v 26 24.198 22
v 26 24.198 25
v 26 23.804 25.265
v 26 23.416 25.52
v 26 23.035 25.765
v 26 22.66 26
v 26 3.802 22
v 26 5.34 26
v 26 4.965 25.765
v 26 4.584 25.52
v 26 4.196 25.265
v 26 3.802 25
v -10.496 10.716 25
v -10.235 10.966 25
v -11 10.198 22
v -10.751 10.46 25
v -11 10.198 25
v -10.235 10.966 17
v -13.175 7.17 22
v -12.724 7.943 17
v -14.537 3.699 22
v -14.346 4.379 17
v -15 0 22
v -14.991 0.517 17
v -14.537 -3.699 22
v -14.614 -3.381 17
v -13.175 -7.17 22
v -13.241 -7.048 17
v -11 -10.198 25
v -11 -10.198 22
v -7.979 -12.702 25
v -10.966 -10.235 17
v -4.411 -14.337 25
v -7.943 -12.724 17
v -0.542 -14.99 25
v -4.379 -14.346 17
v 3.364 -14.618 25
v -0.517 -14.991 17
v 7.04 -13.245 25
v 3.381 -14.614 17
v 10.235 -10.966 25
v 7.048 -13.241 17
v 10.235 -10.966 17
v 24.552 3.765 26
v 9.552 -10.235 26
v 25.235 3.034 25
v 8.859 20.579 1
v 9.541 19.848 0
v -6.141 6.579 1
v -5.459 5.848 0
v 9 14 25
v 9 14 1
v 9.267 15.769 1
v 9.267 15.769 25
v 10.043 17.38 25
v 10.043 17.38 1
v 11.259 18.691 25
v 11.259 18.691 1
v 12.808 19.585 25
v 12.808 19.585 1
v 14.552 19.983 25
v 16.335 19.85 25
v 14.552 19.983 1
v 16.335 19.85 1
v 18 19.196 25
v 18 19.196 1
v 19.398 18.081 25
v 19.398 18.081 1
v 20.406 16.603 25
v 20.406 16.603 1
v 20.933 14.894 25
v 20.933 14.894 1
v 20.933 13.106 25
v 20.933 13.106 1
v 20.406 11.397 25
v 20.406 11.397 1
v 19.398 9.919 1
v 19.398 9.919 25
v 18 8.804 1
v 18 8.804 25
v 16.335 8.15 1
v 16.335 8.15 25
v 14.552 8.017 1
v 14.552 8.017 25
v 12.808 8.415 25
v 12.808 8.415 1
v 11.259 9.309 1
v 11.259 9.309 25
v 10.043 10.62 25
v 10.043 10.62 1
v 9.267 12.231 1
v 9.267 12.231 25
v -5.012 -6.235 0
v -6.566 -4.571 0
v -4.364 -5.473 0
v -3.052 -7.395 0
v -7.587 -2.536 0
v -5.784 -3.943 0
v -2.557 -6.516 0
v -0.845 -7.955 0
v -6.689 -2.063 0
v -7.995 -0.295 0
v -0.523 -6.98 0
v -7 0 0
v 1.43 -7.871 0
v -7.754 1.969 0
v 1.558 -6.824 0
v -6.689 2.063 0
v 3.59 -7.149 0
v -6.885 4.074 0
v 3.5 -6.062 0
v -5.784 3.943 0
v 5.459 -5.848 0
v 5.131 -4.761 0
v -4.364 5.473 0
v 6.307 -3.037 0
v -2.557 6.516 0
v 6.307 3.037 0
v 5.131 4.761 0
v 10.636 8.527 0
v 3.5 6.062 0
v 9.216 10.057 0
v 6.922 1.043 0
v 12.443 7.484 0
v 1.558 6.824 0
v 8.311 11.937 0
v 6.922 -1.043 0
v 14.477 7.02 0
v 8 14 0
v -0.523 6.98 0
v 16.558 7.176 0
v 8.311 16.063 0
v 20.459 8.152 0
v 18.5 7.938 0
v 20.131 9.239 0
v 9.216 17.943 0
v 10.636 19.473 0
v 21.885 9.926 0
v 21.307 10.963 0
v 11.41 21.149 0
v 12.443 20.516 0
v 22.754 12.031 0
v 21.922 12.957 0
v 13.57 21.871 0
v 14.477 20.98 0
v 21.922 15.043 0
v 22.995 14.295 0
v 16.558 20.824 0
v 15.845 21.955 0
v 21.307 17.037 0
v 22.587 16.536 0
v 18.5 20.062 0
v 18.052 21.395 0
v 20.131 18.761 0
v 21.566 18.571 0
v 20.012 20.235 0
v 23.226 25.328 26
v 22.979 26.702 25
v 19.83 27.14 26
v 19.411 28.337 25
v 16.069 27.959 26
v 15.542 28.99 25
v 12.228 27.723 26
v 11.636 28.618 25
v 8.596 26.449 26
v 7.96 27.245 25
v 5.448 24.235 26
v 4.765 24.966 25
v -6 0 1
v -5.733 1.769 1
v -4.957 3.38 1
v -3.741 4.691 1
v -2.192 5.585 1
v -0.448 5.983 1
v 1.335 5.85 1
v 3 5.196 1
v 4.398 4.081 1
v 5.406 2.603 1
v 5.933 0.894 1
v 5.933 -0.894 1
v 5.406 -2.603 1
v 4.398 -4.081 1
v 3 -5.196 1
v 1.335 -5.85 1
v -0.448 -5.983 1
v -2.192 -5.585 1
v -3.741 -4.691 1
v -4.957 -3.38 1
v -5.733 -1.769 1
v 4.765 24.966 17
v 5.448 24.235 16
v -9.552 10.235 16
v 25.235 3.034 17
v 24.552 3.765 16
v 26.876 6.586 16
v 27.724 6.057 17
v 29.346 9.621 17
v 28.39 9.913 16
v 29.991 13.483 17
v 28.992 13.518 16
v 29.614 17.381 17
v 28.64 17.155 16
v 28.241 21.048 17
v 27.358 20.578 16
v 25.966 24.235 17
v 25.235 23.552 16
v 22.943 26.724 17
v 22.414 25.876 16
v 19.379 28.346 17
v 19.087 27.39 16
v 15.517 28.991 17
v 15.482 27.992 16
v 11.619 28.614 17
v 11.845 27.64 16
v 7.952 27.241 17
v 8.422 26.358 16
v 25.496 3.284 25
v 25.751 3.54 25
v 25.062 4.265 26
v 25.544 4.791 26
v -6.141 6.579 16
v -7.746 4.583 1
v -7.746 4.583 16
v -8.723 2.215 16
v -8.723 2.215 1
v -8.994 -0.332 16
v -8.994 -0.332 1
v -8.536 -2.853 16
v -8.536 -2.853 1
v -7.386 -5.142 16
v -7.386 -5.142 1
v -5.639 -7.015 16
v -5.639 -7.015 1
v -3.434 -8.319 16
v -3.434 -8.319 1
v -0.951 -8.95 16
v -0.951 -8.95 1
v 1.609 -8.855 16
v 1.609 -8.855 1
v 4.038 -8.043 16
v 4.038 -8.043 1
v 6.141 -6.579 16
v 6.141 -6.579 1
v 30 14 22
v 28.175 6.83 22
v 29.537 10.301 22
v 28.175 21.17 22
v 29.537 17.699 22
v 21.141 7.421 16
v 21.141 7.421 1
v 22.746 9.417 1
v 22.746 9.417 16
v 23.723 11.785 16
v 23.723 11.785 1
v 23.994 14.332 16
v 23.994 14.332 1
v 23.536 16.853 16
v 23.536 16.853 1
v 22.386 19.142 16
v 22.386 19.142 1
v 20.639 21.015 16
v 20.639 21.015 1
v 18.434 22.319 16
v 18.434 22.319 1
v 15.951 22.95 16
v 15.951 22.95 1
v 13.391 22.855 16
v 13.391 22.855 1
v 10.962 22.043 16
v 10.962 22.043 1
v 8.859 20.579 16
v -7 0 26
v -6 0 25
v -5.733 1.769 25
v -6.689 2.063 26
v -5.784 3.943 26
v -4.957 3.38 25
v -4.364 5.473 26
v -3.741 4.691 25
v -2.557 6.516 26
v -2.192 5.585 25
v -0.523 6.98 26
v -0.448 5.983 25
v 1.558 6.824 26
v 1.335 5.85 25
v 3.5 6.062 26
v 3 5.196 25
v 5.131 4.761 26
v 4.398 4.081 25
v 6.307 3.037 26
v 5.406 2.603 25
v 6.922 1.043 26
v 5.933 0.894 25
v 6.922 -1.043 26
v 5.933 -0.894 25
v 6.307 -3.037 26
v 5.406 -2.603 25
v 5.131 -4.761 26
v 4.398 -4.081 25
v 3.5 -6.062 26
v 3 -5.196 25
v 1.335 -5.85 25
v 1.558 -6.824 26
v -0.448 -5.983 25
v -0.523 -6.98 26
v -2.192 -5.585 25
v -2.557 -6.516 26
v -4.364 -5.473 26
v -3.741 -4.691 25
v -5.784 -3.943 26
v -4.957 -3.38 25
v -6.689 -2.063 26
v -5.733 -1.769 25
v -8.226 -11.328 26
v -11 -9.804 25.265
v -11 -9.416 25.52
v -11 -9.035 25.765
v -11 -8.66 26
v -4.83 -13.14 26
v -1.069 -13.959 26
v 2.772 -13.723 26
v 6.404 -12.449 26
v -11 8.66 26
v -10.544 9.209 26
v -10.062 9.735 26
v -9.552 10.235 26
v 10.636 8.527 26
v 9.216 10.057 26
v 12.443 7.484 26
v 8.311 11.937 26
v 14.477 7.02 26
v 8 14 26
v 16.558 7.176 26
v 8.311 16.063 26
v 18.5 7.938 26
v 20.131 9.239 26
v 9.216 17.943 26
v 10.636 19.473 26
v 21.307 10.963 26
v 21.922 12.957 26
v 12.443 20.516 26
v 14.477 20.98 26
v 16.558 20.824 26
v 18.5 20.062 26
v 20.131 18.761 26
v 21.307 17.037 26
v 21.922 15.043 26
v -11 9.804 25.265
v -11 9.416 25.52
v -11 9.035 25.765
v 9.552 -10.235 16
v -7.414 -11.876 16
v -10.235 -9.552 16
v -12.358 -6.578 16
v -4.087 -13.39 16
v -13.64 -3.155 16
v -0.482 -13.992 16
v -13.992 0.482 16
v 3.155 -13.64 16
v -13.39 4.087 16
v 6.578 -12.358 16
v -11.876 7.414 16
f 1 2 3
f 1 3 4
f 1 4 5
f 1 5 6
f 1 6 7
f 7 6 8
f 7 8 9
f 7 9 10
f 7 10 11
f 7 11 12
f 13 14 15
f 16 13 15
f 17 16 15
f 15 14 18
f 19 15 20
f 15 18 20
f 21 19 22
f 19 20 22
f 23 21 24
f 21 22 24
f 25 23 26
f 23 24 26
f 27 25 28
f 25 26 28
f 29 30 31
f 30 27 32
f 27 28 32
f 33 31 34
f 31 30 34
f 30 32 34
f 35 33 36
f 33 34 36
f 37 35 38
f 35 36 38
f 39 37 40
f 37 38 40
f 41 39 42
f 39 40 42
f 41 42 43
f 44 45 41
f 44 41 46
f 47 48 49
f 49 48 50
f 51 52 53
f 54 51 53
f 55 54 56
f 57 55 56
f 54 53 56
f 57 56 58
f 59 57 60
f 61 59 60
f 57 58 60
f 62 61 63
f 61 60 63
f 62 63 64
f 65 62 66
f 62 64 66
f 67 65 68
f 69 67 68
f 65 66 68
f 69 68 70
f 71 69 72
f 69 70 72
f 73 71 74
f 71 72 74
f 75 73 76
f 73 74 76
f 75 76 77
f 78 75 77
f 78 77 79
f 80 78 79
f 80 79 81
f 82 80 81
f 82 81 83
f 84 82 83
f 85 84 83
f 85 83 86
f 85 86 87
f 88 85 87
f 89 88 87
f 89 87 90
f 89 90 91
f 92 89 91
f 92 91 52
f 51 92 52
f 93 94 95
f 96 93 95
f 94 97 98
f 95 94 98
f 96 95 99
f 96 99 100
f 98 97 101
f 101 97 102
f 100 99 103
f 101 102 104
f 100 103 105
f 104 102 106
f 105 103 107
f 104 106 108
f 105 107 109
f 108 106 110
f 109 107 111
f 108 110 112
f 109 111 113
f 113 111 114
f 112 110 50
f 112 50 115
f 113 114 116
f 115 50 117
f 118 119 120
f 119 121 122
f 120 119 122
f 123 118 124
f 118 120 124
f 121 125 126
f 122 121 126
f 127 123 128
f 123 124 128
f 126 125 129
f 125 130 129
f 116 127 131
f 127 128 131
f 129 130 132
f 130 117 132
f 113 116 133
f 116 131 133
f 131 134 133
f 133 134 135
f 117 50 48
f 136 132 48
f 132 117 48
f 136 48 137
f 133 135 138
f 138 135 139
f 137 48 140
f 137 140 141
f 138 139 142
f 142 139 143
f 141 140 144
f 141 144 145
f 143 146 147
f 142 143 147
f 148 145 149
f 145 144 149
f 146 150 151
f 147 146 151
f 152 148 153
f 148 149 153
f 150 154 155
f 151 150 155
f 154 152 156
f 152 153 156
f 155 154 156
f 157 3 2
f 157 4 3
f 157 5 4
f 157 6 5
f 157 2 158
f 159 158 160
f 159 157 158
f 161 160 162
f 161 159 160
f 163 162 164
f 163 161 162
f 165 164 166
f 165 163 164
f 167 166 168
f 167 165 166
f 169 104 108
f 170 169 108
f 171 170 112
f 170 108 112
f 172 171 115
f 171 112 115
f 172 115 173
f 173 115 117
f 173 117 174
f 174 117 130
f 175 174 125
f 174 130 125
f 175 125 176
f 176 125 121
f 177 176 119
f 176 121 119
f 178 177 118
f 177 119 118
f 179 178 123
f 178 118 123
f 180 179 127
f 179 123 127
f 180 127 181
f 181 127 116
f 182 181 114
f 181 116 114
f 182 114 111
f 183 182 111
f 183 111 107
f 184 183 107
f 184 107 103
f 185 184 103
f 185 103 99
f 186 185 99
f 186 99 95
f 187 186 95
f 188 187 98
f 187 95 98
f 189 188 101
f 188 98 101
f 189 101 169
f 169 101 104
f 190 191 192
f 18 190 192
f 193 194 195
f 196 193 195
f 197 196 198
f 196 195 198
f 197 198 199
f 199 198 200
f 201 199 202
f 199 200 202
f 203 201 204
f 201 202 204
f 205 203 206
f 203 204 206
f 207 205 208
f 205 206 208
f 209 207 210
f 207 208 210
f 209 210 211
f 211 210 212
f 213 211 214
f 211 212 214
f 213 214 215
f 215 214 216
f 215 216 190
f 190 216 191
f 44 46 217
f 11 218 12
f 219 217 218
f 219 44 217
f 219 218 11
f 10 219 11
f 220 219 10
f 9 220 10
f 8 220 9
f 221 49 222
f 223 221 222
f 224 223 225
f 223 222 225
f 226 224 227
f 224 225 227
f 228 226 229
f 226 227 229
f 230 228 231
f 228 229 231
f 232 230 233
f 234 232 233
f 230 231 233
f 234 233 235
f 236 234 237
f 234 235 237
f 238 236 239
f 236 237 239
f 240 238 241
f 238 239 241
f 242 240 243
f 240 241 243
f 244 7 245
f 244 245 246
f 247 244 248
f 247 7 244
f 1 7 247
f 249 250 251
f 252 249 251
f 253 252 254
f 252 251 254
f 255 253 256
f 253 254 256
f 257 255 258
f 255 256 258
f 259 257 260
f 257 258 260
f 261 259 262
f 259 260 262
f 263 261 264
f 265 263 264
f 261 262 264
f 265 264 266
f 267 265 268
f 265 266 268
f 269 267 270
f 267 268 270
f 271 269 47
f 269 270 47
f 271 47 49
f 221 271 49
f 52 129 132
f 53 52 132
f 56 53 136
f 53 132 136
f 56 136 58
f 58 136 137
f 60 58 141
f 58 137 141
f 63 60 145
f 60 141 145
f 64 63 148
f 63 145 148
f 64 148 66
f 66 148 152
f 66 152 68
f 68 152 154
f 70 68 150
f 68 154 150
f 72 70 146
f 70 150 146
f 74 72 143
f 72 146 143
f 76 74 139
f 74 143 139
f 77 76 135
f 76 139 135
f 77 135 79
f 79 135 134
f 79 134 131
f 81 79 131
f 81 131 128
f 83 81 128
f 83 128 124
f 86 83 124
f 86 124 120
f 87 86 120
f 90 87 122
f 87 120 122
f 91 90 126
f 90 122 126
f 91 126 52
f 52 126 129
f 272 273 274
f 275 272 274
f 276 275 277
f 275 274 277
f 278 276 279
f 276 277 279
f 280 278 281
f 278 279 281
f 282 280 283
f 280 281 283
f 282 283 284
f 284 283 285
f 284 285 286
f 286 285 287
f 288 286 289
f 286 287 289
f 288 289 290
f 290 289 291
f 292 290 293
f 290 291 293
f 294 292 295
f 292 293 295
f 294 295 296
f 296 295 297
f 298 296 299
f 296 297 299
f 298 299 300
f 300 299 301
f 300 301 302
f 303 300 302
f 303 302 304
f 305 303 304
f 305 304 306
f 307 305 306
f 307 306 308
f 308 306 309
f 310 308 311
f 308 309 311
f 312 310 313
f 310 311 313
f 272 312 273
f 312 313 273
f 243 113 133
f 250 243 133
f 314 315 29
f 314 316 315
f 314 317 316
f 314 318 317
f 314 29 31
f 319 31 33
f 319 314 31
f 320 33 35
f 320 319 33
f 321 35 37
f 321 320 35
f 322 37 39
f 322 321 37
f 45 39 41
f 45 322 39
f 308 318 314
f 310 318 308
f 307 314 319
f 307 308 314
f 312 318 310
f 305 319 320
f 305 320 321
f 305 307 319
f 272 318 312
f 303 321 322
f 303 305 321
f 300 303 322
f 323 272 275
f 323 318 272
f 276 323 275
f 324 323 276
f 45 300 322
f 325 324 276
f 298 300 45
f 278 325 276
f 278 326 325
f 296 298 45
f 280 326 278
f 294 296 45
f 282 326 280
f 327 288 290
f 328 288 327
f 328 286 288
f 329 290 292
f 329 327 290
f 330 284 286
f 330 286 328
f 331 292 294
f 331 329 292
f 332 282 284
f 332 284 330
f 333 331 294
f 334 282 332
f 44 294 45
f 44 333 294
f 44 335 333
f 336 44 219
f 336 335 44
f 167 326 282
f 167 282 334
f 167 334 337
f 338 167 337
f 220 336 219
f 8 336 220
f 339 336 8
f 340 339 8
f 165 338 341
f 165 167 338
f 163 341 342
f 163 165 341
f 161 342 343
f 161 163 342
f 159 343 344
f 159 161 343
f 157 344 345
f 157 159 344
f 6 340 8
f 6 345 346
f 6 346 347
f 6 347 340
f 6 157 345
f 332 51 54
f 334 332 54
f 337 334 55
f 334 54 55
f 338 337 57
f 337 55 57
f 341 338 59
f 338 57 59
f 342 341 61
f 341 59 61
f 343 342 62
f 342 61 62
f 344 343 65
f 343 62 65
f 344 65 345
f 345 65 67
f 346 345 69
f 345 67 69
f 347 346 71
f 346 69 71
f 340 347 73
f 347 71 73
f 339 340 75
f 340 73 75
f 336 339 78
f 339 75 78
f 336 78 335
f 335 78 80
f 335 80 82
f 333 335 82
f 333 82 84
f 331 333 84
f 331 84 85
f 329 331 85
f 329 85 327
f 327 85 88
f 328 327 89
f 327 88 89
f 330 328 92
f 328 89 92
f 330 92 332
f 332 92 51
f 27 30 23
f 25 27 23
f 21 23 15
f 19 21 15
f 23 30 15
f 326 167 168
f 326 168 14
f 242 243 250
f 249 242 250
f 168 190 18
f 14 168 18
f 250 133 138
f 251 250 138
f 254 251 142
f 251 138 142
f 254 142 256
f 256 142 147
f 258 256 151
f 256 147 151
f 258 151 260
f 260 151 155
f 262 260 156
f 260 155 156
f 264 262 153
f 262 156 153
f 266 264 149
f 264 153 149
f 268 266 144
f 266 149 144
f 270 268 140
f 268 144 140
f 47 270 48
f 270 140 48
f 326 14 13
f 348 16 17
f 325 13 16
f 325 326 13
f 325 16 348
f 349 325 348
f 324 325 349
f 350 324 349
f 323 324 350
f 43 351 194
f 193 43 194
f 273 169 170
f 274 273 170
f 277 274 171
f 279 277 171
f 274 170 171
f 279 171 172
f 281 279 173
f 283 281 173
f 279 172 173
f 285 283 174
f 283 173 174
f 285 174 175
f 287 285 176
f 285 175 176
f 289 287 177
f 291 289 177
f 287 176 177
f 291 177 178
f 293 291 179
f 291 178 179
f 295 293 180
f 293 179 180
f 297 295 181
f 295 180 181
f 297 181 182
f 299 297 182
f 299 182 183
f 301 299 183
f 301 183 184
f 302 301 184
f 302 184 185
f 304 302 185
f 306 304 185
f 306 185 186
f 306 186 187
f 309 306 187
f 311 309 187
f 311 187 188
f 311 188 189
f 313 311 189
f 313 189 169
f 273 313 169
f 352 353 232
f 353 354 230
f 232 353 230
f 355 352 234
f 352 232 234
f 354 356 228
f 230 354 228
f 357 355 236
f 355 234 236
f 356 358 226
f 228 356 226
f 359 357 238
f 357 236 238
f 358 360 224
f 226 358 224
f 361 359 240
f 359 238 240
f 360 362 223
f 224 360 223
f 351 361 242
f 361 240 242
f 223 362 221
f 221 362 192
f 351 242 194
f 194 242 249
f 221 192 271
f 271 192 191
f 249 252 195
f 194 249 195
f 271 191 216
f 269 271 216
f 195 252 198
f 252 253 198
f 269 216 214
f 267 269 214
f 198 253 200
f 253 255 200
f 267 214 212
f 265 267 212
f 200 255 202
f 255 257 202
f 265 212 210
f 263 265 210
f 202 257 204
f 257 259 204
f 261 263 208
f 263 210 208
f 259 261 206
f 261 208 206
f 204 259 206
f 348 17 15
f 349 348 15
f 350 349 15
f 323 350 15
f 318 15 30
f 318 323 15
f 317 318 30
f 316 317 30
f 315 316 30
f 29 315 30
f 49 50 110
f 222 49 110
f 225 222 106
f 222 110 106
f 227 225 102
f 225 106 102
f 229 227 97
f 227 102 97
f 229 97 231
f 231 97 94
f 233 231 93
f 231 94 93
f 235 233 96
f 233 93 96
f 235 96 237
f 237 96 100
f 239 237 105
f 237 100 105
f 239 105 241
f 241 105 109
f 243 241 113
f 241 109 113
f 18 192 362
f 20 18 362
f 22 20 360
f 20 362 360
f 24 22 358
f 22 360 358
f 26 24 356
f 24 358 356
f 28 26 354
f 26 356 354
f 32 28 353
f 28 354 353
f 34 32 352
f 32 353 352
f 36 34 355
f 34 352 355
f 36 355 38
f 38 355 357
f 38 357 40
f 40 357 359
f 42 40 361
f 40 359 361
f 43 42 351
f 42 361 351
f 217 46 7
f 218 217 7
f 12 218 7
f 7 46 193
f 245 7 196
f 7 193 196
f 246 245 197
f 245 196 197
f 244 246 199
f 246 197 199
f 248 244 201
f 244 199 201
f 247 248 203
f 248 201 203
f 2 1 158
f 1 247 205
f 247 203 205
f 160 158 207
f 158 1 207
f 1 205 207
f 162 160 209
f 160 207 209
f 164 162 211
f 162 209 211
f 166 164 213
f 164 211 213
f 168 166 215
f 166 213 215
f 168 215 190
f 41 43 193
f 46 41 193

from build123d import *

# Parameters (mm, degrees)
EXTRUDE_1_DEPTH     = 16
EXTRUDE_2_DEPTH     = 10
CUT_EXTRUDE_1_DEPTH = 4
SKETCH_4_R          = 6
CUT_EXTRUDE_2_DEPTH = 27
CHAMFER_1_SIZE      = 1


with BuildPart() as part:
    # 草图1 → 凸台-拉伸1 (new body)
    with BuildSketch(Plane.XY):
        with BuildLine():
            Line((6.140864253, -6.579497414), (21.140864253, 7.420502586))
            ThreePointArc((21.140864253, 7.420502586), (21.579497414, 20.140864253), (8.859135747, 20.579497414))
            Line((8.859135747, 20.579497414), (-6.140864253, 6.579497414))
            ThreePointArc((-6.140864253, 6.579497414), (-6.579497414, -6.140864253), (6.140864253, -6.579497414))
        make_face()
    extrude(amount=EXTRUDE_1_DEPTH)

    # 草图2 → 凸台-拉伸2 (add)
    with BuildSketch(Plane.XY.offset(16)):
        with BuildLine():
            Line((10.234773755, -10.965829024), (25.234773755, 3.034170976))
            ThreePointArc((25.234773755, 3.034170976), (25.965829024, 24.234773755), (4.765226245, 24.965829024))
            Line((4.765226245, 24.965829024), (-10.234773755, 10.965829024))
            ThreePointArc((-10.234773755, 10.965829024), (-10.965829024, -10.234773755), (10.234773755, -10.965829024))
        make_face()
    extrude(amount=EXTRUDE_2_DEPTH)

    # 草图3 → 切除-拉伸1 (cut)
    with BuildSketch(Plane.XY.offset(26)):
        with BuildLine():
            Line((26, 24.198039027), (26, 3.801960973))
            ThreePointArc((26, 3.801960973), (30, 14), (26, 24.198039027))
        make_face()
        with BuildLine():
            Line((-11, 10.198039027), (-11, -10.198039027))
            ThreePointArc((-11, -10.198039027), (-15, 0), (-11, 10.198039027))
        make_face()
    extrude(amount=-CUT_EXTRUDE_1_DEPTH, mode=Mode.SUBTRACT)

    # 草图4 → 切除-拉伸2 (cut, through all)
    with BuildSketch(Plane(origin=(0, 0, 0), x_dir=(-1, 0, 0), z_dir=(0, 0, -1))):
        Circle(SKETCH_4_R)
        with Locations((-15, 14)):
            Circle(SKETCH_4_R)
    extrude(amount=-CUT_EXTRUDE_2_DEPTH, mode=Mode.SUBTRACT)

    # 倒角1
    chamfer_1_edges = [part.edges().sort_by_distance(p)[0] for p in [
        (-10.965829024, -10.234773755, 16),
        (17.734773755, -3.965829024, 16),
        (25.965829024, 24.234773755, 16),
        (-2.734773755, 17.965829024, 16),
        (-10.624324895, 10.588848876, 26),
        (17.734773755, -3.965829024, 26),
        (25.624324895, 3.411151124, 26),
        (-2.734773755, 17.965829024, 26),
        (-0.542003848, -14.990204529, 26),
        (15.542003848, 28.990204529, 26),
        (1.359135747, 13.579497414, 0),
        (6, 0, 26),
        (6, 0, 0),
        (21, 14, 26),
        (21, 14, 0),
        (21.579497414, 20.140864253, 0),
        (13.640864253, 0.420502586, 0),
        (-6.579497414, -6.140864253, 0),
    ]]
    chamfer(chamfer_1_edges, length=CHAMFER_1_SIZE)


solid = part.part
